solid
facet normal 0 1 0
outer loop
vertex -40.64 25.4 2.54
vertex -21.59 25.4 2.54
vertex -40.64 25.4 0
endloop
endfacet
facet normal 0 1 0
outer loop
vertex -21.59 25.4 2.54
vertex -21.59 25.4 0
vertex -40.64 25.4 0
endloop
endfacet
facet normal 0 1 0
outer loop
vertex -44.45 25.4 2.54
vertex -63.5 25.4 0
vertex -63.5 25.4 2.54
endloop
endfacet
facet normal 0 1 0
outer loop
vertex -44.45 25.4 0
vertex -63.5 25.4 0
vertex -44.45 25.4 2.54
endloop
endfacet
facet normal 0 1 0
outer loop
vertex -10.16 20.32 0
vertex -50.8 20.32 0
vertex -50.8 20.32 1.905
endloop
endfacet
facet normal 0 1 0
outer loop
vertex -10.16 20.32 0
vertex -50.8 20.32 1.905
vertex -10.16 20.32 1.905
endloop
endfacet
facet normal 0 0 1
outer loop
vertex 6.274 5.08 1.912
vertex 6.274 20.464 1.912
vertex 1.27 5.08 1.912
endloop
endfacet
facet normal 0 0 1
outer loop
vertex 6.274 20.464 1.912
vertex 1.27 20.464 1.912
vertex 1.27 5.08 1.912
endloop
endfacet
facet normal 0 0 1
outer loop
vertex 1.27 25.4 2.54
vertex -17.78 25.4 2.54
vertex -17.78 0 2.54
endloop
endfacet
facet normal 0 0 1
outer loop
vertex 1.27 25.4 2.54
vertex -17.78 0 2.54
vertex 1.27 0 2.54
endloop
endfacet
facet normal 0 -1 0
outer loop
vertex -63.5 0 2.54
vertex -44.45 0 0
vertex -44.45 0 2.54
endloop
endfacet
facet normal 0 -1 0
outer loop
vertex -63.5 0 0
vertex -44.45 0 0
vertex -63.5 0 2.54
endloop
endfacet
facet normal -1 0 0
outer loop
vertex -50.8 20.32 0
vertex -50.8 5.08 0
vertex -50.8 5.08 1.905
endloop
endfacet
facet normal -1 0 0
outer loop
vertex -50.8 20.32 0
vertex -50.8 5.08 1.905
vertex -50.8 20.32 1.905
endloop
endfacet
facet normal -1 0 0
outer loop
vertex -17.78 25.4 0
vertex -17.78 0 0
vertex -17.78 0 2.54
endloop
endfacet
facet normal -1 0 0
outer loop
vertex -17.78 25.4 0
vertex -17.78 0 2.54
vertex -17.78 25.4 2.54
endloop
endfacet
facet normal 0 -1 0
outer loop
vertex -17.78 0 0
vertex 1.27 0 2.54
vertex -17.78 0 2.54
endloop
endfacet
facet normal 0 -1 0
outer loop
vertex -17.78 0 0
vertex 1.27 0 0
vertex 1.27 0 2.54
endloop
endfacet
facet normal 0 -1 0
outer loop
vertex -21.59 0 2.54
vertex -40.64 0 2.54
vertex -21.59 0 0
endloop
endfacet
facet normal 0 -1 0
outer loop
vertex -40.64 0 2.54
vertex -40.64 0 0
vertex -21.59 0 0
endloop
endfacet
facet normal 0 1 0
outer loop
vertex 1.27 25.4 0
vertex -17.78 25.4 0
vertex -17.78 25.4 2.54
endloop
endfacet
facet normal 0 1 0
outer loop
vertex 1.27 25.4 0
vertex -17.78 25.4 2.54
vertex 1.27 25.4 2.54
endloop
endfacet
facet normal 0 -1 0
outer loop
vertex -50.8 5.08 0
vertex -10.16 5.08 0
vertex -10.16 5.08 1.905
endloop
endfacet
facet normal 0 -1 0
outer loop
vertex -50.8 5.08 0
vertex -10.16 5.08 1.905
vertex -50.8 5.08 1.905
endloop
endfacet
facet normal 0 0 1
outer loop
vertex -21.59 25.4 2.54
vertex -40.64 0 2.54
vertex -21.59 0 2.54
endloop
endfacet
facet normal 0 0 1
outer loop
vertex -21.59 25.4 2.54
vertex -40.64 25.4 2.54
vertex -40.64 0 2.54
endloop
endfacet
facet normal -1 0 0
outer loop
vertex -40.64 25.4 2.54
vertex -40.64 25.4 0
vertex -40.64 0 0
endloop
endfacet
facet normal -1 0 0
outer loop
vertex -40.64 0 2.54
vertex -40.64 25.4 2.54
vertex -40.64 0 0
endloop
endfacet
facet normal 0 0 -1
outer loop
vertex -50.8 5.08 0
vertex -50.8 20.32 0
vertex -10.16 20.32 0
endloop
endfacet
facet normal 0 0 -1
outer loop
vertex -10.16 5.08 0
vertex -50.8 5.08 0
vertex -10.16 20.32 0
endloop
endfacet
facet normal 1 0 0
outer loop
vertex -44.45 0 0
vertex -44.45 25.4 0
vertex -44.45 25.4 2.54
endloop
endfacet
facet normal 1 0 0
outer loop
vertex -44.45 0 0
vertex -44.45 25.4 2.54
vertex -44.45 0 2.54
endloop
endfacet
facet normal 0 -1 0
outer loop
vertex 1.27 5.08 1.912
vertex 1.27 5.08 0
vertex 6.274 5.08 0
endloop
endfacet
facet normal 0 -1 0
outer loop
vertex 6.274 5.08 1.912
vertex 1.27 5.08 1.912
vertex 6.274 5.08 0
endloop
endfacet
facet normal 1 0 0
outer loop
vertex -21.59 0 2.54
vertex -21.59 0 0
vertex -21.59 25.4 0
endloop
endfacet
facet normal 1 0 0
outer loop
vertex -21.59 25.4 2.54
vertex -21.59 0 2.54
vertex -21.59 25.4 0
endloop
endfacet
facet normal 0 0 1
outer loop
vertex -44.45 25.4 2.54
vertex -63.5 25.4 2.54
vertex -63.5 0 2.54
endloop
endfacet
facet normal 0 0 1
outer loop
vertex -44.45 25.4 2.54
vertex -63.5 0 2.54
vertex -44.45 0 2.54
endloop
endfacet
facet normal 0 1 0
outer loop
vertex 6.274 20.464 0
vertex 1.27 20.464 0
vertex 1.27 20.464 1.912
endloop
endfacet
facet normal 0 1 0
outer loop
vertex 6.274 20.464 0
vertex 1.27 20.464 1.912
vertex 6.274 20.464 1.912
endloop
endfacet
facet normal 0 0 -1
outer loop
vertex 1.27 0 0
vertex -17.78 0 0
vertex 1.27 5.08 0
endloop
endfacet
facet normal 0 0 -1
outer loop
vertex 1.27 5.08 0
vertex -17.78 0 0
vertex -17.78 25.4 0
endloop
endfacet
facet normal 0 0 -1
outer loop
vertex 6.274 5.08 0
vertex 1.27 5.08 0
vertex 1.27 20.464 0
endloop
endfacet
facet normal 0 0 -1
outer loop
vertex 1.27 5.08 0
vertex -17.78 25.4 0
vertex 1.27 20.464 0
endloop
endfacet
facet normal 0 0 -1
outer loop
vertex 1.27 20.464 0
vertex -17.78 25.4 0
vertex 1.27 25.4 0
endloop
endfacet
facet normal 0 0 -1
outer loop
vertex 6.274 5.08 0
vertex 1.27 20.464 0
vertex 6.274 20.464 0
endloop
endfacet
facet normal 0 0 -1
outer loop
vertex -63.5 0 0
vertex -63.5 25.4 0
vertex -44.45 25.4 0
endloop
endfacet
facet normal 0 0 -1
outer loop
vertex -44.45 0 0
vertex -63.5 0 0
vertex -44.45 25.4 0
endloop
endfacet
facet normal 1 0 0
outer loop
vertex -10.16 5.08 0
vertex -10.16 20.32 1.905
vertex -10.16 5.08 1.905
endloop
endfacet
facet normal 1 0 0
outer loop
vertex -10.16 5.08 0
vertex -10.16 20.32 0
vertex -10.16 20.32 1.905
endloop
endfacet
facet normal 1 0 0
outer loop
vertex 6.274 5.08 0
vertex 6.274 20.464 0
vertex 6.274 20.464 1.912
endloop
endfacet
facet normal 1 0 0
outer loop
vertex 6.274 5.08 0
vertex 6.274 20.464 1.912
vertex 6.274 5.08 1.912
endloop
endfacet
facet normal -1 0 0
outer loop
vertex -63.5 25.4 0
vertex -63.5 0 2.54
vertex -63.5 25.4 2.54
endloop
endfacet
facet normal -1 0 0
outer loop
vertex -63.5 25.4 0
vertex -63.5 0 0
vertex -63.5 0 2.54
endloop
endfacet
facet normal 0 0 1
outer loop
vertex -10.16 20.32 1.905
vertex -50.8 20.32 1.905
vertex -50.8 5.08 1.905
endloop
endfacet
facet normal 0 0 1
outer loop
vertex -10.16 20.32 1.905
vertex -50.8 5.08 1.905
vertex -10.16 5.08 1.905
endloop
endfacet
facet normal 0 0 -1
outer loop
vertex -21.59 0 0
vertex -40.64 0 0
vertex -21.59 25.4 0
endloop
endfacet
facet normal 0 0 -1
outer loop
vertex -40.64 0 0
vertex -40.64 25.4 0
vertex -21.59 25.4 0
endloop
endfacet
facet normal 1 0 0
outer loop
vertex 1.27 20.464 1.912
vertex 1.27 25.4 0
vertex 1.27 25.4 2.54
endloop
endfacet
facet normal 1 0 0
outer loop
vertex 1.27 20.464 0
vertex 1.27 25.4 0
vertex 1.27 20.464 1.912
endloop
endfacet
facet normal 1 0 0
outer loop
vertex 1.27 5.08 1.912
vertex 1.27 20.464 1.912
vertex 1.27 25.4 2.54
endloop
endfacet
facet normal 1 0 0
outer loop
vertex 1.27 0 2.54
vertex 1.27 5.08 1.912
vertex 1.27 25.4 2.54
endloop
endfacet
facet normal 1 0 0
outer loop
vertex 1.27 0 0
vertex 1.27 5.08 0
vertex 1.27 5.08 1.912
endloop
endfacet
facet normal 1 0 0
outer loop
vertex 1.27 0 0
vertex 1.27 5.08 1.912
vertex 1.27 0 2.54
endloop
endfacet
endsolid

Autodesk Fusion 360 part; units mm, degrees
sketch "Sketch1" plane through (0, 0, 0) normal (0, 0, 1) x (1, 0, 0)
  line L0 (-63.5, 25.4) -> (-44.45, 25.4)
  line L1 (-44.45, 25.4) -> (-44.45, 0)
  line L2 (-44.45, 0) -> (-63.5, 0)
  line L3 (-63.5, 0) -> (-63.5, 25.4)
  line L4 (-44.45, 20.2856) -> (-40.64, 20.2856)
  line L5 (-40.64, 20.2856) -> (-40.64, 5.0456)
  line L6 (-40.64, 5.0456) -> (-44.45, 5.0456)
  line L7 (-44.45, 5.0456) -> (-44.45, 20.2856)
  line L8 (-40.64, 0) -> (-21.59, 0)
  line L9 (-21.59, 0) -> (-21.59, 25.4)
  line L10 (-21.59, 25.4) -> (-40.64, 25.4)
  line L11 (-40.64, 25.4) -> (-40.64, 0)
  line L12 (-21.59, 5.0849) -> (-17.78, 5.0849)
  line L13 (-17.78, 5.0849) -> (-17.78, 20.32)
  line L14 (-17.78, 20.32) -> (-21.59, 20.32)
  line L15 (-21.59, 20.32) -> (-21.59, 5.0849)
  line L16 (-17.78, 25.4) -> (1.27, 25.4)
  line L17 (1.27, 25.4) -> (1.27, 0)
  line L18 (1.27, 0) -> (-17.78, 0)
  line L19 (-17.78, 0) -> (-17.78, 25.4)
  line L20 (1.27, 20.2099) -> (5.08, 20.2099)
  line L21 (5.08, 20.2099) -> (5.08, 4.9699)
  line L22 (5.08, 4.9699) -> (1.27, 4.9699)
  line L23 (1.27, 4.9699) -> (1.27, 20.2099)
  dimension "d1" = 19.05
  dimension "d2" = 25.4
  dimension "d3" = 15.24
  dimension "d4" = 19.05
  dimension "d5" = 19.05
  dimension "d6" = 3.81
  dimension "d7" = 15.24
extrude "Extrude1" add sketch "Sketch1" along normal blind 2.54 contours L0 L1 L2 L3 L7 | L5 L8 L9 L10 L11 L15 | L13 L16 L17 L18 L19 L23 makes body 1 at (-11.43, 16.9333, 0) makes body 2 at (-34.29, 16.9333, 0) makes body 3 at (-57.15, 8.4667, 0)
sketch "Sketch2" plane through (0, 0, 0) normal (0, 0, 1) x (1, 0, 0)
  line L0 (-50.8, 20.32) -> (-10.16, 20.32)
  line L1 (-10.16, 20.32) -> (-10.16, 5.08)
  line L2 (-10.16, 5.08) -> (-50.8, 5.08)
  line L3 (-50.8, 5.08) -> (-50.8, 20.32)
extrude "Extrude2" add sketch "Sketch2" along normal blind 1.905 separate body makes body 4
sketch "Sketch3" plane through (1.27, 0, 0) normal (1, 0, 0) x (0, 1, 0)
  line L0 (0, 0) -> (25.4, 0)
  line L1 (25.4, 0) -> (25.4, 2.54)
  line L2 (25.4, 2.54) -> (0, 2.54)
  line L3 (0, 2.54) -> (0, 0)
  line L4 (5.08, 0) -> (20.4638, 0)
  line L5 (20.4638, 0) -> (20.4638, 1.2766)
  line L6 (20.4638, 1.2766) -> (5.08, 1.2766)
  line L7 (5.08, 1.2766) -> (5.08, 0)
extrude "Extrude3" add sketch "Sketch3" along normal blind 5.0038 contours L0 L4 L5 L6 L7 bodies 1
extrude "Extrude4" add 1 faces at (2.9379, 15.3358, 1.2766) along direction (0, 0, 1) blind 0.635 on bodies 1 bodies 1
